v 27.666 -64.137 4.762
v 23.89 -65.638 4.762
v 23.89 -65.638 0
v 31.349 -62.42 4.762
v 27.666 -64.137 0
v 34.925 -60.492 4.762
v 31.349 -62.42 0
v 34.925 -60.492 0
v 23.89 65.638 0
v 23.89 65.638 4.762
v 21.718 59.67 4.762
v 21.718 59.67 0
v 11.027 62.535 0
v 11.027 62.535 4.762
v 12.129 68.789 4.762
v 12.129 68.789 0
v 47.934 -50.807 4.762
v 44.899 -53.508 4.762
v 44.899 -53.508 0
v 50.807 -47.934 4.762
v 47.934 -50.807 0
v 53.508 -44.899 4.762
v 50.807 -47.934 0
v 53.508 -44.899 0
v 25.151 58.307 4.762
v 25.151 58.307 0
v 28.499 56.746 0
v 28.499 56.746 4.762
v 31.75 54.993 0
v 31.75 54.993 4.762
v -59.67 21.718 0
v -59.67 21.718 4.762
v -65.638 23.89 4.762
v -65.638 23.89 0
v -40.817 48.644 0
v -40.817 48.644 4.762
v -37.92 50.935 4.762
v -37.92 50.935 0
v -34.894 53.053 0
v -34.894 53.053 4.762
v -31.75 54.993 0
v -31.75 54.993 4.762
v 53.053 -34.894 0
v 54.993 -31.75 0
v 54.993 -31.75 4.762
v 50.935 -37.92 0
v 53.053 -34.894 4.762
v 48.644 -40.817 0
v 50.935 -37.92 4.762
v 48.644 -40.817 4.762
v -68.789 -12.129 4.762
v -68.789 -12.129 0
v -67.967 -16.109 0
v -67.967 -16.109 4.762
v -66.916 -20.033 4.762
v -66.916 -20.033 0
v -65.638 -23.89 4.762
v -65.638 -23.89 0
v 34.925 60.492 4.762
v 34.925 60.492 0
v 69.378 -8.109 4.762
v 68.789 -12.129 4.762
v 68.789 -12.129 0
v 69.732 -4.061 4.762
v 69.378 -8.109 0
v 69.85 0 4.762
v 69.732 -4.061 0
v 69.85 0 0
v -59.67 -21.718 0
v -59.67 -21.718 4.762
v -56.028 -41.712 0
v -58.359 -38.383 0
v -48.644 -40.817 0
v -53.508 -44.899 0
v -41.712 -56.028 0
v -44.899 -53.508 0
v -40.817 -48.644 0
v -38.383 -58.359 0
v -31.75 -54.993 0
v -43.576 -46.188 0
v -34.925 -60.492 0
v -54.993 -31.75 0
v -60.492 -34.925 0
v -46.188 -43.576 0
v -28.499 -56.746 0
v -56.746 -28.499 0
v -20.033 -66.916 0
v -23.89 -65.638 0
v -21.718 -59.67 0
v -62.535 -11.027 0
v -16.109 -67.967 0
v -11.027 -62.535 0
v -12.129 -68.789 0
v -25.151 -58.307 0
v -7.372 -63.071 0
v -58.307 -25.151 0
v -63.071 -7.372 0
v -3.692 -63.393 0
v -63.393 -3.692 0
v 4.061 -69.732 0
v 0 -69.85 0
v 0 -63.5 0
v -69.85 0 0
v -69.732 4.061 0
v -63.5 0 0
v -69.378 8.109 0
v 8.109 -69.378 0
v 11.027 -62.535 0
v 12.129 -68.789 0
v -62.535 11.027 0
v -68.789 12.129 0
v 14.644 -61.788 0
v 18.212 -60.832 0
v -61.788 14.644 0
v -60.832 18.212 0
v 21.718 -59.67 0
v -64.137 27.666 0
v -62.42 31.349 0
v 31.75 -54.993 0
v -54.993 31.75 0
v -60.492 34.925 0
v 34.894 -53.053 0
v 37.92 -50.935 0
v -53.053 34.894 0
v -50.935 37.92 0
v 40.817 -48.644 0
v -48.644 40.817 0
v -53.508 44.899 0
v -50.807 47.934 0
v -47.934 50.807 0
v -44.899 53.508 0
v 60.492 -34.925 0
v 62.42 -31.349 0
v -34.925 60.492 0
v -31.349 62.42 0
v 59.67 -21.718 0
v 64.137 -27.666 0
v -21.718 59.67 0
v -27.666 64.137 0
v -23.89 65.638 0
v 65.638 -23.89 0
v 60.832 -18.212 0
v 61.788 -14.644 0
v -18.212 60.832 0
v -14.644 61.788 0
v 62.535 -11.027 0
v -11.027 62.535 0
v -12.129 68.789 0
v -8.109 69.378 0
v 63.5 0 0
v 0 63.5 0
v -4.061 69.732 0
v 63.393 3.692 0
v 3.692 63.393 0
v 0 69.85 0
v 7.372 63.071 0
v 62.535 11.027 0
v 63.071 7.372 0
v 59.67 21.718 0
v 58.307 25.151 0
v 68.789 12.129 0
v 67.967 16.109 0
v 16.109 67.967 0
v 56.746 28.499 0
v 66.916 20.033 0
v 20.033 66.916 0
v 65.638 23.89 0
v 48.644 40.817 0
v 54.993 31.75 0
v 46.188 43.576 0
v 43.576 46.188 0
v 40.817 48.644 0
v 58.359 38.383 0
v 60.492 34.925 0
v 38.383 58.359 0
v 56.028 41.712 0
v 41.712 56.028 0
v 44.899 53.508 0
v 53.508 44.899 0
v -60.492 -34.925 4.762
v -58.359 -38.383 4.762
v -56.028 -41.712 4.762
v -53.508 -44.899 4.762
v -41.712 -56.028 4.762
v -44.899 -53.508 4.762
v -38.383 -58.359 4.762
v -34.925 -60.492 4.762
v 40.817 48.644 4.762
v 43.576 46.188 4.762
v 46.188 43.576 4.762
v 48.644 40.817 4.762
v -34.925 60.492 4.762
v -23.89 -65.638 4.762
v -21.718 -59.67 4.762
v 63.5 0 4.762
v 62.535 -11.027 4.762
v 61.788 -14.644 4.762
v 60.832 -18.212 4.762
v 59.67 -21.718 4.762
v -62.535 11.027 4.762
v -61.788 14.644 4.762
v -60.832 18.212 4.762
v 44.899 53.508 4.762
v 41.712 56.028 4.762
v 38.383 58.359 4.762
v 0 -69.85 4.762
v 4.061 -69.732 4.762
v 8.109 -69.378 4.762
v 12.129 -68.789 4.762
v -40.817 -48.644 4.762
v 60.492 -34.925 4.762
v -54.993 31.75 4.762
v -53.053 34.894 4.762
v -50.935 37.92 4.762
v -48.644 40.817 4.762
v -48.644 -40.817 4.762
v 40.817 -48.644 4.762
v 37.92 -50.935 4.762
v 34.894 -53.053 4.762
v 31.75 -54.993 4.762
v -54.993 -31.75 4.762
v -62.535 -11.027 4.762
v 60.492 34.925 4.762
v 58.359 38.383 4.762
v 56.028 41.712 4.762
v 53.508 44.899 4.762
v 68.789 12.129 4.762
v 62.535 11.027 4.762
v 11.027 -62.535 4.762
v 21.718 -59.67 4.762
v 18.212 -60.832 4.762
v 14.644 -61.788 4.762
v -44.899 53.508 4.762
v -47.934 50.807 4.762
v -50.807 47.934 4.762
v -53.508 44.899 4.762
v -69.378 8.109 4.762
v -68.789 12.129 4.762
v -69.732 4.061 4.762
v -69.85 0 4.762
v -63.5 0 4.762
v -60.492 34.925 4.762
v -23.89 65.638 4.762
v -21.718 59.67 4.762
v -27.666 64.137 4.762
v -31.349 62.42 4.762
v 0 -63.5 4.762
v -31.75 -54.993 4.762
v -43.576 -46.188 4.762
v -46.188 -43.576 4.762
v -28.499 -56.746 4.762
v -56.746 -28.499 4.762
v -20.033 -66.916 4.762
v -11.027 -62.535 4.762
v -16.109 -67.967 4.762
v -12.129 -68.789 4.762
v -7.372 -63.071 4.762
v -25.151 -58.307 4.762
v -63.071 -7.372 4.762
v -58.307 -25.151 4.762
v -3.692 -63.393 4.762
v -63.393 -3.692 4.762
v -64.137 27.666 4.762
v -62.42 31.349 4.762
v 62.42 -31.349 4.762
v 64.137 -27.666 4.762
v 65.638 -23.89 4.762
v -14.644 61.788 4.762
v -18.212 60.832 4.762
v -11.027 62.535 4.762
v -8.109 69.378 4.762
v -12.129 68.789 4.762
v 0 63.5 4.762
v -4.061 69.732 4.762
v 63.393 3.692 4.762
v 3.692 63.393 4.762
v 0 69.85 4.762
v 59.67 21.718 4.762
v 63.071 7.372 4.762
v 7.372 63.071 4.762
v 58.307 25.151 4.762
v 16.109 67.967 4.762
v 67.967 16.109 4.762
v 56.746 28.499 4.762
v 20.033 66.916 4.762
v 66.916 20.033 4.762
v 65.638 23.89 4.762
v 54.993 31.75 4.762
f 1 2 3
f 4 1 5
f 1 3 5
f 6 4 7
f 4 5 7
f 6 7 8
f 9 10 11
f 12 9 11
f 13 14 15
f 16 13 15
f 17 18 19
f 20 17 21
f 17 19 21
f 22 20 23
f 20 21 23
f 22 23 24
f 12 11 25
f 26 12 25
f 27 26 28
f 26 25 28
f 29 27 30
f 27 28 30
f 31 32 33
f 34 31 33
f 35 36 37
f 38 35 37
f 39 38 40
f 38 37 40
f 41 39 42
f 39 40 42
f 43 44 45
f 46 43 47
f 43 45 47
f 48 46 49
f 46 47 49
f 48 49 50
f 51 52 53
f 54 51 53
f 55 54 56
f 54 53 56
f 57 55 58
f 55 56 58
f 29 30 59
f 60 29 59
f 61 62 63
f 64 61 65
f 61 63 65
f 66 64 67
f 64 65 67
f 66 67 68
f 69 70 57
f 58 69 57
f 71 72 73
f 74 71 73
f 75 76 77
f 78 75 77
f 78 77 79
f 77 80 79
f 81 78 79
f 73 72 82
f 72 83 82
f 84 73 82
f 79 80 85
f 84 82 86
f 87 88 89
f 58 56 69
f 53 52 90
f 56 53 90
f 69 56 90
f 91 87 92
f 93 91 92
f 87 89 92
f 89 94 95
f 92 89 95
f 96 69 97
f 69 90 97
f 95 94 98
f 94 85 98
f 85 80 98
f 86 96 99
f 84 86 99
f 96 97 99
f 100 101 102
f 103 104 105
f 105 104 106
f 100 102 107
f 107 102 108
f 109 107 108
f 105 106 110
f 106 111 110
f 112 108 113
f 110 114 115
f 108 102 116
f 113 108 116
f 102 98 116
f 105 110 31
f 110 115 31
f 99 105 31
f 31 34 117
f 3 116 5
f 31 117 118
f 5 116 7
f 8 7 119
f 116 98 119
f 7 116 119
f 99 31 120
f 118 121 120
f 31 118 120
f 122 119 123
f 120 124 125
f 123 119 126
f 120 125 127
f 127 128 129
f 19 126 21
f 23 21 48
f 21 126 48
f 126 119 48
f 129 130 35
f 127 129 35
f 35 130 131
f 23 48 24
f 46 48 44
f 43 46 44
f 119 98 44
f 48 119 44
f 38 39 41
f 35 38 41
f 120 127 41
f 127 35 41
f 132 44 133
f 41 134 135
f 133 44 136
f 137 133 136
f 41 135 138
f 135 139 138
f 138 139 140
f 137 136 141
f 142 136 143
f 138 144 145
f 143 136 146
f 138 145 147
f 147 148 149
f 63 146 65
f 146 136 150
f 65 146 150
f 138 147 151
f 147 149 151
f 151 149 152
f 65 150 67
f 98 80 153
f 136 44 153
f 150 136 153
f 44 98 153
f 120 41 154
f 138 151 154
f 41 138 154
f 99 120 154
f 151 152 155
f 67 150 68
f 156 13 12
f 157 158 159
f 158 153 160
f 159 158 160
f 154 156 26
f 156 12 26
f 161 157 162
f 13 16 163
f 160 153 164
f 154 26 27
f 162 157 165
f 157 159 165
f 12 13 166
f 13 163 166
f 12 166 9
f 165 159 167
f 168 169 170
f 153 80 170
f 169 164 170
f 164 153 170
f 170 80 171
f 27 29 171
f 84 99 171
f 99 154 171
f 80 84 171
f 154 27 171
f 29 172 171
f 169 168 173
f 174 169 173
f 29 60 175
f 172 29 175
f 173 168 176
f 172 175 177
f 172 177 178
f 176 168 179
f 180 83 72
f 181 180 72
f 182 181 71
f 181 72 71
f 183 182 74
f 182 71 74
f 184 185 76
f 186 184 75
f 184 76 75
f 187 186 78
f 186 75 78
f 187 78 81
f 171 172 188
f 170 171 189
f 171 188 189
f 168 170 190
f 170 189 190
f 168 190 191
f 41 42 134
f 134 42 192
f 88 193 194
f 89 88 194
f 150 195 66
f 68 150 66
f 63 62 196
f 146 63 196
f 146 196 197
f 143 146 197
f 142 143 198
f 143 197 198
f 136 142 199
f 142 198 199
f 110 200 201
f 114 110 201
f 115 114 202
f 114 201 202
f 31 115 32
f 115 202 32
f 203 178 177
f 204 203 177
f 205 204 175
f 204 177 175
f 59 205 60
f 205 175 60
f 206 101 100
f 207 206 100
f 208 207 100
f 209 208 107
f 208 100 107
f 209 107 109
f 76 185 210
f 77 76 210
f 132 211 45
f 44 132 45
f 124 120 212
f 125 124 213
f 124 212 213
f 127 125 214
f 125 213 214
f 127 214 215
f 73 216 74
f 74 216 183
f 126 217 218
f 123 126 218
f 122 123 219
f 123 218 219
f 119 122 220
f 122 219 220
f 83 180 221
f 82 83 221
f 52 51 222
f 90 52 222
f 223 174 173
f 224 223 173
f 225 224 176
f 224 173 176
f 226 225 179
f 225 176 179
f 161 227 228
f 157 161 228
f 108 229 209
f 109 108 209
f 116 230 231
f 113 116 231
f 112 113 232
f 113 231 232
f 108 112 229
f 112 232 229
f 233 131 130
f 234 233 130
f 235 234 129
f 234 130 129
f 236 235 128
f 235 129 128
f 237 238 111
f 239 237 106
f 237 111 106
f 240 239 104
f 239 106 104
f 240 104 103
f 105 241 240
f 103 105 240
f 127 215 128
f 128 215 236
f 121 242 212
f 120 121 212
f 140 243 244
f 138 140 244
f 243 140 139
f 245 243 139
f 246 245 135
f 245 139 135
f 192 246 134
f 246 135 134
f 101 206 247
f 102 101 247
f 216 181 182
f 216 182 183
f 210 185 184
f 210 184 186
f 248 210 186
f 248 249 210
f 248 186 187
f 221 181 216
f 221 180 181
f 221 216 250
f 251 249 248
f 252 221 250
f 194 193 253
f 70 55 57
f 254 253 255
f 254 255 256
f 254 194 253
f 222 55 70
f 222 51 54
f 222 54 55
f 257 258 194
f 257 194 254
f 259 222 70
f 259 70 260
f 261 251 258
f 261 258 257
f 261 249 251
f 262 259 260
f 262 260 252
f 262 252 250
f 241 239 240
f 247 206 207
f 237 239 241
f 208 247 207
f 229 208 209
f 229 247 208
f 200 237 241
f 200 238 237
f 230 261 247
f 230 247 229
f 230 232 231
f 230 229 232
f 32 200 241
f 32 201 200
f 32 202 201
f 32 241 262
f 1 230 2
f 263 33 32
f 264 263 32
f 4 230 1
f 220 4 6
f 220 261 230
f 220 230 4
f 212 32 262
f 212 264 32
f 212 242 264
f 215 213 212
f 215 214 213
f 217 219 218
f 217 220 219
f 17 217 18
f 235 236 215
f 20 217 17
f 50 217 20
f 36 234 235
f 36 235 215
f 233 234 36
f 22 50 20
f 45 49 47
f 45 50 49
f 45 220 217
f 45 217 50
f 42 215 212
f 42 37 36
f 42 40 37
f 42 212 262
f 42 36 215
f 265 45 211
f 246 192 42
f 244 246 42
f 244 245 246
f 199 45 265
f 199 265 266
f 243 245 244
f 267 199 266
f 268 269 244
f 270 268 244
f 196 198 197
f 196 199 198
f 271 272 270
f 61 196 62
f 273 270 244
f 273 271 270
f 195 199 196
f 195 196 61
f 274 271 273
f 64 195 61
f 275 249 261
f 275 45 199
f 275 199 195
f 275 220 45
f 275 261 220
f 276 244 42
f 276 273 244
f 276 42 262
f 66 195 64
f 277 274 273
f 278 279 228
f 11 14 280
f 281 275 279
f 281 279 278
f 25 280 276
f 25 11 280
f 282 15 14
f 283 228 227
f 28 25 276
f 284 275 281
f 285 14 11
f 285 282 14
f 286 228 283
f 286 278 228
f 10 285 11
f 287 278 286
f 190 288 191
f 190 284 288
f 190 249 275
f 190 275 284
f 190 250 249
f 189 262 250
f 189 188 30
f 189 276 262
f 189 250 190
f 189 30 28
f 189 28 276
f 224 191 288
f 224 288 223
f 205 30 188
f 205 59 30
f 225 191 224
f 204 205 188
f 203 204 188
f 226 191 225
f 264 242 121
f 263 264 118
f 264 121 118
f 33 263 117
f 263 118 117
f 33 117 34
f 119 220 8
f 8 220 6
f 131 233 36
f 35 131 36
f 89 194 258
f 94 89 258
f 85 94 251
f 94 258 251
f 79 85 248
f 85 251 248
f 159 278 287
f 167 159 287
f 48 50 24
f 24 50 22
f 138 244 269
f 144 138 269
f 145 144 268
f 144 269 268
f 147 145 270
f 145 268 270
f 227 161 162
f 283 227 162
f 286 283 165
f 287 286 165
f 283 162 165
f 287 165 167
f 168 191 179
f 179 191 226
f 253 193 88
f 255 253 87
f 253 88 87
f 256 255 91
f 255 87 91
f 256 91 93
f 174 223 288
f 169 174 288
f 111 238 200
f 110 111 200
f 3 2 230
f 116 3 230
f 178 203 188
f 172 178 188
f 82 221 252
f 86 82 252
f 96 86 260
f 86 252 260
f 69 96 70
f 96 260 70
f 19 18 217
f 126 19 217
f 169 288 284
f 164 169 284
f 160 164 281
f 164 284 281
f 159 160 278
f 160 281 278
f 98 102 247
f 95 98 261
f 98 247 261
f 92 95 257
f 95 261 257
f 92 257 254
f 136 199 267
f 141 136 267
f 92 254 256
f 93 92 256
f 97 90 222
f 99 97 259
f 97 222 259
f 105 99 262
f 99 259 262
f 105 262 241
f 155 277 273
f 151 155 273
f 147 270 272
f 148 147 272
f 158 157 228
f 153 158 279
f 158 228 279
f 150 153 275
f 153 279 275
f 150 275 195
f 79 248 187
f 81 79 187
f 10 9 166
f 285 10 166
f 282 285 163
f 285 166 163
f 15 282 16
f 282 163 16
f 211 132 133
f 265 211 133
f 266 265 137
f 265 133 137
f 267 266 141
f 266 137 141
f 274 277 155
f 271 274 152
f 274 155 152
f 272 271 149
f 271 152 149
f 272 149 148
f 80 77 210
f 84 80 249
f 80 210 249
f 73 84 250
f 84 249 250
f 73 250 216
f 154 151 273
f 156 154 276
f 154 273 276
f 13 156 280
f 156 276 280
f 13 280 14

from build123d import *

# Parameters (mm, degrees)
F0_R     = 69.85
F1_DEPTH = 4.7625
F3_DEPTH = 25.4


with BuildPart() as f1:
    # F0 (on Top) → F1 (new body)
    with BuildSketch(Plane.XY):
        Circle(F0_R)
    extrude(amount=F1_DEPTH)

    # F2 (on face) → F3 (cut)
    with BuildSketch(Plane.XY.offset(4.7625)):
        with BuildLine():
            ThreePointArc((12.12932521, 68.7888215479), (6.0878286309, 69.5841996617), (0, 69.85))
            Line((0, 69.85), (0, 63.5))
            ThreePointArc((0, 63.5), (5.5343896645, 63.2583633288), (11.0266592819, 62.5352923163))
            Line((11.0266592819, 62.5352923163), (12.12932521, 68.7888215479))
        make_face()
        with BuildLine():
            ThreePointArc((-12.12932521, 68.7888215479), (-18.0785103004, 67.4699189663), (-23.8901070113, 65.6375295619))
            Line((-23.8901070113, 65.6375295619), (-21.7182791012, 59.6704814199))
            ThreePointArc((-21.7182791012, 59.6704814199), (-16.435009364, 61.3362899694), (-11.0266592819, 62.5352923163))
            Line((-11.0266592819, 62.5352923163), (-12.12932521, 68.7888215479))
        make_face()
        with BuildLine():
            ThreePointArc((-34.925, 60.4918744543), (-40.0643140791, 57.2177702936), (-44.8987145366, 53.5082043519))
            Line((-44.8987145366, 53.5082043519), (-40.8170132151, 48.6438221381))
            ThreePointArc((-40.8170132151, 48.6438221381), (-36.4221037083, 52.0161548124), (-31.75, 54.9926131403))
            Line((-31.75, 54.9926131403), (-34.925, 60.4918744543))
        make_face()
        with BuildLine():
            ThreePointArc((-53.5082043519, 44.8987145366), (-57.2177702936, 40.0643140791), (-60.4918744543, 34.925))
            Line((-60.4918744543, 34.925), (-54.9926131403, 31.75))
            ThreePointArc((-54.9926131403, 31.75), (-52.0161548124, 36.4221037083), (-48.6438221381, 40.8170132151))
            Line((-48.6438221381, 40.8170132151), (-53.5082043519, 44.8987145366))
        make_face()
        with BuildLine():
            ThreePointArc((-65.6375295619, 23.8901070113), (-67.4699189663, 18.0785103004), (-68.7888215479, 12.12932521))
            Line((-68.7888215479, 12.12932521), (-62.5352923163, 11.0266592819))
            ThreePointArc((-62.5352923163, 11.0266592819), (-61.3362899694, 16.435009364), (-59.6704814199, 21.7182791012))
            Line((-59.6704814199, 21.7182791012), (-65.6375295619, 23.8901070113))
        make_face()
        with BuildLine():
            ThreePointArc((-69.85, 0), (-69.5841996617, -6.0878286309), (-68.7888215479, -12.12932521))
            Line((-68.7888215479, -12.12932521), (-62.5352923163, -11.0266592819))
            ThreePointArc((-62.5352923163, -11.0266592819), (-63.2583633288, -5.5343896645), (-63.5, 0))
            Line((-63.5, 0), (-69.85, 0))
        make_face()
        with BuildLine():
            ThreePointArc((-65.6375295619, -23.8901070113), (-63.3055989245, -29.5198855826), (-60.4918744543, -34.925))
            Line((-60.4918744543, -34.925), (-54.9926131403, -31.75))
            ThreePointArc((-54.9926131403, -31.75), (-57.5505444768, -26.8362596205), (-59.6704814199, -21.7182791012))
            Line((-59.6704814199, -21.7182791012), (-65.6375295619, -23.8901070113))
        make_face()
        with BuildLine():
            ThreePointArc((-53.5082043519, -44.8987145366), (-49.3914086659, -49.3914086659), (-44.8987145366, -53.5082043519))
            Line((-44.8987145366, -53.5082043519), (-40.8170132151, -48.6438221381))
            ThreePointArc((-40.8170132151, -48.6438221381), (-44.9012806053, -44.9012806053), (-48.6438221381, -40.8170132151))
            Line((-48.6438221381, -40.8170132151), (-53.5082043519, -44.8987145366))
        make_face()
        with BuildLine():
            ThreePointArc((-34.925, -60.4918744543), (-29.5198855826, -63.3055989245), (-23.8901070113, -65.6375295619))
            Line((-23.8901070113, -65.6375295619), (-21.7182791012, -59.6704814199))
            ThreePointArc((-21.7182791012, -59.6704814199), (-26.8362596205, -57.5505444768), (-31.75, -54.9926131403))
            Line((-31.75, -54.9926131403), (-34.925, -60.4918744543))
        make_face()
        with BuildLine():
            ThreePointArc((-12.12932521, -68.7888215479), (-6.0878286309, -69.5841996617), (0, -69.85))
            Line((0, -69.85), (0, -63.5))
            ThreePointArc((0, -63.5), (-5.5343896645, -63.2583633288), (-11.0266592819, -62.5352923163))
            Line((-11.0266592819, -62.5352923163), (-12.12932521, -68.7888215479))
        make_face()
        with BuildLine():
            ThreePointArc((12.12932521, -68.7888215479), (18.0785103004, -67.4699189663), (23.8901070113, -65.6375295619))
            Line((23.8901070113, -65.6375295619), (21.7182791012, -59.6704814199))
            ThreePointArc((21.7182791012, -59.6704814199), (16.435009364, -61.3362899694), (11.0266592819, -62.5352923163))
            Line((11.0266592819, -62.5352923163), (12.12932521, -68.7888215479))
        make_face()
        with BuildLine():
            ThreePointArc((34.925, -60.4918744543), (40.0643140791, -57.2177702936), (44.8987145366, -53.5082043519))
            Line((44.8987145366, -53.5082043519), (40.8170132151, -48.6438221381))
            ThreePointArc((40.8170132151, -48.6438221381), (36.4221037083, -52.0161548124), (31.75, -54.9926131403))
            Line((31.75, -54.9926131403), (34.925, -60.4918744543))
        make_face()
        with BuildLine():
            ThreePointArc((53.5082043519, -44.8987145366), (57.2177702936, -40.0643140791), (60.4918744543, -34.925))
            Line((60.4918744543, -34.925), (54.9926131403, -31.75))
            ThreePointArc((54.9926131403, -31.75), (52.0161548124, -36.4221037083), (48.6438221381, -40.8170132151))
            Line((48.6438221381, -40.8170132151), (53.5082043519, -44.8987145366))
        make_face()
        with BuildLine():
            ThreePointArc((65.6375295619, -23.8901070113), (67.4699189663, -18.0785103004), (68.7888215479, -12.12932521))
            Line((68.7888215479, -12.12932521), (62.5352923163, -11.0266592819))
            ThreePointArc((62.5352923163, -11.0266592819), (61.3362899694, -16.435009364), (59.6704814199, -21.7182791012))
            Line((59.6704814199, -21.7182791012), (65.6375295619, -23.8901070113))
        make_face()
        with BuildLine():
            ThreePointArc((69.85, 0), (69.5841996617, 6.0878286309), (68.7888215479, 12.12932521))
            Line((68.7888215479, 12.12932521), (62.5352923163, 11.0266592819))
            ThreePointArc((62.5352923163, 11.0266592819), (63.2583633288, 5.5343896645), (63.5, 0))
            Line((63.5, 0), (69.85, 0))
        make_face()
        with BuildLine():
            ThreePointArc((65.6375295619, 23.8901070113), (63.3055989245, 29.5198855826), (60.4918744543, 34.925))
            Line((60.4918744543, 34.925), (54.9926131403, 31.75))
            ThreePointArc((54.9926131403, 31.75), (57.5505444768, 26.8362596205), (59.6704814199, 21.7182791012))
            Line((59.6704814199, 21.7182791012), (65.6375295619, 23.8901070113))
        make_face()
        with BuildLine():
            ThreePointArc((53.5082043519, 44.8987145366), (49.3914086659, 49.3914086659), (44.8987145366, 53.5082043519))
            Line((44.8987145366, 53.5082043519), (40.8170132151, 48.6438221381))
            ThreePointArc((40.8170132151, 48.6438221381), (44.9012806053, 44.9012806053), (48.6438221381, 40.8170132151))
            Line((48.6438221381, 40.8170132151), (53.5082043519, 44.8987145366))
        make_face()
        with BuildLine():
            ThreePointArc((34.925, 60.4918744543), (29.5198855826, 63.3055989245), (23.8901070113, 65.6375295619))
            Line((23.8901070113, 65.6375295619), (21.7182791012, 59.6704814199))
            ThreePointArc((21.7182791012, 59.6704814199), (26.8362596205, 57.5505444768), (31.75, 54.9926131403))
            Line((31.75, 54.9926131403), (34.925, 60.4918744543))
        make_face()
    extrude(amount=-F3_DEPTH, mode=Mode.SUBTRACT)


solid = f1.part
